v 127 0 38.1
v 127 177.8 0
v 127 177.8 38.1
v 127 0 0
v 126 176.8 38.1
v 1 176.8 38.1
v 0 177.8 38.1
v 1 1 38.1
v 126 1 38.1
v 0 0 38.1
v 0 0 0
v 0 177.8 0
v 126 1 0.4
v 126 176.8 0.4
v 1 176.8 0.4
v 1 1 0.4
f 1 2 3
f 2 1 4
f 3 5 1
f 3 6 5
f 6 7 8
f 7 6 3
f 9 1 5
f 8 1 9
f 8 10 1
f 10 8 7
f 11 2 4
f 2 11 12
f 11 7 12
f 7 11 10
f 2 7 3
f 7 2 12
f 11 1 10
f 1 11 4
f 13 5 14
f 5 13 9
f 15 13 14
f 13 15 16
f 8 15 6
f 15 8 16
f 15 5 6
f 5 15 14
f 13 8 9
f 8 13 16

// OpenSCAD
// file: ../bin.scad
module bin(width, depth, height, wall_thickness, floor_thickness) {
    difference() {
        cube([width, depth, height]);
        translate([
            wall_thickness, wall_thickness, floor_thickness
        ]) cube([
            width - 2 * wall_thickness,
            depth - 2 * wall_thickness,
            height - floor_thickness
        ]);
    }
}
// main file
use <../bin.scad>

// 1 inch = 25.4 mm

bin(
    5 * 25.4,
    7 * 25.4,
    1.5 * 25.4,
    1,
    0.4
);
